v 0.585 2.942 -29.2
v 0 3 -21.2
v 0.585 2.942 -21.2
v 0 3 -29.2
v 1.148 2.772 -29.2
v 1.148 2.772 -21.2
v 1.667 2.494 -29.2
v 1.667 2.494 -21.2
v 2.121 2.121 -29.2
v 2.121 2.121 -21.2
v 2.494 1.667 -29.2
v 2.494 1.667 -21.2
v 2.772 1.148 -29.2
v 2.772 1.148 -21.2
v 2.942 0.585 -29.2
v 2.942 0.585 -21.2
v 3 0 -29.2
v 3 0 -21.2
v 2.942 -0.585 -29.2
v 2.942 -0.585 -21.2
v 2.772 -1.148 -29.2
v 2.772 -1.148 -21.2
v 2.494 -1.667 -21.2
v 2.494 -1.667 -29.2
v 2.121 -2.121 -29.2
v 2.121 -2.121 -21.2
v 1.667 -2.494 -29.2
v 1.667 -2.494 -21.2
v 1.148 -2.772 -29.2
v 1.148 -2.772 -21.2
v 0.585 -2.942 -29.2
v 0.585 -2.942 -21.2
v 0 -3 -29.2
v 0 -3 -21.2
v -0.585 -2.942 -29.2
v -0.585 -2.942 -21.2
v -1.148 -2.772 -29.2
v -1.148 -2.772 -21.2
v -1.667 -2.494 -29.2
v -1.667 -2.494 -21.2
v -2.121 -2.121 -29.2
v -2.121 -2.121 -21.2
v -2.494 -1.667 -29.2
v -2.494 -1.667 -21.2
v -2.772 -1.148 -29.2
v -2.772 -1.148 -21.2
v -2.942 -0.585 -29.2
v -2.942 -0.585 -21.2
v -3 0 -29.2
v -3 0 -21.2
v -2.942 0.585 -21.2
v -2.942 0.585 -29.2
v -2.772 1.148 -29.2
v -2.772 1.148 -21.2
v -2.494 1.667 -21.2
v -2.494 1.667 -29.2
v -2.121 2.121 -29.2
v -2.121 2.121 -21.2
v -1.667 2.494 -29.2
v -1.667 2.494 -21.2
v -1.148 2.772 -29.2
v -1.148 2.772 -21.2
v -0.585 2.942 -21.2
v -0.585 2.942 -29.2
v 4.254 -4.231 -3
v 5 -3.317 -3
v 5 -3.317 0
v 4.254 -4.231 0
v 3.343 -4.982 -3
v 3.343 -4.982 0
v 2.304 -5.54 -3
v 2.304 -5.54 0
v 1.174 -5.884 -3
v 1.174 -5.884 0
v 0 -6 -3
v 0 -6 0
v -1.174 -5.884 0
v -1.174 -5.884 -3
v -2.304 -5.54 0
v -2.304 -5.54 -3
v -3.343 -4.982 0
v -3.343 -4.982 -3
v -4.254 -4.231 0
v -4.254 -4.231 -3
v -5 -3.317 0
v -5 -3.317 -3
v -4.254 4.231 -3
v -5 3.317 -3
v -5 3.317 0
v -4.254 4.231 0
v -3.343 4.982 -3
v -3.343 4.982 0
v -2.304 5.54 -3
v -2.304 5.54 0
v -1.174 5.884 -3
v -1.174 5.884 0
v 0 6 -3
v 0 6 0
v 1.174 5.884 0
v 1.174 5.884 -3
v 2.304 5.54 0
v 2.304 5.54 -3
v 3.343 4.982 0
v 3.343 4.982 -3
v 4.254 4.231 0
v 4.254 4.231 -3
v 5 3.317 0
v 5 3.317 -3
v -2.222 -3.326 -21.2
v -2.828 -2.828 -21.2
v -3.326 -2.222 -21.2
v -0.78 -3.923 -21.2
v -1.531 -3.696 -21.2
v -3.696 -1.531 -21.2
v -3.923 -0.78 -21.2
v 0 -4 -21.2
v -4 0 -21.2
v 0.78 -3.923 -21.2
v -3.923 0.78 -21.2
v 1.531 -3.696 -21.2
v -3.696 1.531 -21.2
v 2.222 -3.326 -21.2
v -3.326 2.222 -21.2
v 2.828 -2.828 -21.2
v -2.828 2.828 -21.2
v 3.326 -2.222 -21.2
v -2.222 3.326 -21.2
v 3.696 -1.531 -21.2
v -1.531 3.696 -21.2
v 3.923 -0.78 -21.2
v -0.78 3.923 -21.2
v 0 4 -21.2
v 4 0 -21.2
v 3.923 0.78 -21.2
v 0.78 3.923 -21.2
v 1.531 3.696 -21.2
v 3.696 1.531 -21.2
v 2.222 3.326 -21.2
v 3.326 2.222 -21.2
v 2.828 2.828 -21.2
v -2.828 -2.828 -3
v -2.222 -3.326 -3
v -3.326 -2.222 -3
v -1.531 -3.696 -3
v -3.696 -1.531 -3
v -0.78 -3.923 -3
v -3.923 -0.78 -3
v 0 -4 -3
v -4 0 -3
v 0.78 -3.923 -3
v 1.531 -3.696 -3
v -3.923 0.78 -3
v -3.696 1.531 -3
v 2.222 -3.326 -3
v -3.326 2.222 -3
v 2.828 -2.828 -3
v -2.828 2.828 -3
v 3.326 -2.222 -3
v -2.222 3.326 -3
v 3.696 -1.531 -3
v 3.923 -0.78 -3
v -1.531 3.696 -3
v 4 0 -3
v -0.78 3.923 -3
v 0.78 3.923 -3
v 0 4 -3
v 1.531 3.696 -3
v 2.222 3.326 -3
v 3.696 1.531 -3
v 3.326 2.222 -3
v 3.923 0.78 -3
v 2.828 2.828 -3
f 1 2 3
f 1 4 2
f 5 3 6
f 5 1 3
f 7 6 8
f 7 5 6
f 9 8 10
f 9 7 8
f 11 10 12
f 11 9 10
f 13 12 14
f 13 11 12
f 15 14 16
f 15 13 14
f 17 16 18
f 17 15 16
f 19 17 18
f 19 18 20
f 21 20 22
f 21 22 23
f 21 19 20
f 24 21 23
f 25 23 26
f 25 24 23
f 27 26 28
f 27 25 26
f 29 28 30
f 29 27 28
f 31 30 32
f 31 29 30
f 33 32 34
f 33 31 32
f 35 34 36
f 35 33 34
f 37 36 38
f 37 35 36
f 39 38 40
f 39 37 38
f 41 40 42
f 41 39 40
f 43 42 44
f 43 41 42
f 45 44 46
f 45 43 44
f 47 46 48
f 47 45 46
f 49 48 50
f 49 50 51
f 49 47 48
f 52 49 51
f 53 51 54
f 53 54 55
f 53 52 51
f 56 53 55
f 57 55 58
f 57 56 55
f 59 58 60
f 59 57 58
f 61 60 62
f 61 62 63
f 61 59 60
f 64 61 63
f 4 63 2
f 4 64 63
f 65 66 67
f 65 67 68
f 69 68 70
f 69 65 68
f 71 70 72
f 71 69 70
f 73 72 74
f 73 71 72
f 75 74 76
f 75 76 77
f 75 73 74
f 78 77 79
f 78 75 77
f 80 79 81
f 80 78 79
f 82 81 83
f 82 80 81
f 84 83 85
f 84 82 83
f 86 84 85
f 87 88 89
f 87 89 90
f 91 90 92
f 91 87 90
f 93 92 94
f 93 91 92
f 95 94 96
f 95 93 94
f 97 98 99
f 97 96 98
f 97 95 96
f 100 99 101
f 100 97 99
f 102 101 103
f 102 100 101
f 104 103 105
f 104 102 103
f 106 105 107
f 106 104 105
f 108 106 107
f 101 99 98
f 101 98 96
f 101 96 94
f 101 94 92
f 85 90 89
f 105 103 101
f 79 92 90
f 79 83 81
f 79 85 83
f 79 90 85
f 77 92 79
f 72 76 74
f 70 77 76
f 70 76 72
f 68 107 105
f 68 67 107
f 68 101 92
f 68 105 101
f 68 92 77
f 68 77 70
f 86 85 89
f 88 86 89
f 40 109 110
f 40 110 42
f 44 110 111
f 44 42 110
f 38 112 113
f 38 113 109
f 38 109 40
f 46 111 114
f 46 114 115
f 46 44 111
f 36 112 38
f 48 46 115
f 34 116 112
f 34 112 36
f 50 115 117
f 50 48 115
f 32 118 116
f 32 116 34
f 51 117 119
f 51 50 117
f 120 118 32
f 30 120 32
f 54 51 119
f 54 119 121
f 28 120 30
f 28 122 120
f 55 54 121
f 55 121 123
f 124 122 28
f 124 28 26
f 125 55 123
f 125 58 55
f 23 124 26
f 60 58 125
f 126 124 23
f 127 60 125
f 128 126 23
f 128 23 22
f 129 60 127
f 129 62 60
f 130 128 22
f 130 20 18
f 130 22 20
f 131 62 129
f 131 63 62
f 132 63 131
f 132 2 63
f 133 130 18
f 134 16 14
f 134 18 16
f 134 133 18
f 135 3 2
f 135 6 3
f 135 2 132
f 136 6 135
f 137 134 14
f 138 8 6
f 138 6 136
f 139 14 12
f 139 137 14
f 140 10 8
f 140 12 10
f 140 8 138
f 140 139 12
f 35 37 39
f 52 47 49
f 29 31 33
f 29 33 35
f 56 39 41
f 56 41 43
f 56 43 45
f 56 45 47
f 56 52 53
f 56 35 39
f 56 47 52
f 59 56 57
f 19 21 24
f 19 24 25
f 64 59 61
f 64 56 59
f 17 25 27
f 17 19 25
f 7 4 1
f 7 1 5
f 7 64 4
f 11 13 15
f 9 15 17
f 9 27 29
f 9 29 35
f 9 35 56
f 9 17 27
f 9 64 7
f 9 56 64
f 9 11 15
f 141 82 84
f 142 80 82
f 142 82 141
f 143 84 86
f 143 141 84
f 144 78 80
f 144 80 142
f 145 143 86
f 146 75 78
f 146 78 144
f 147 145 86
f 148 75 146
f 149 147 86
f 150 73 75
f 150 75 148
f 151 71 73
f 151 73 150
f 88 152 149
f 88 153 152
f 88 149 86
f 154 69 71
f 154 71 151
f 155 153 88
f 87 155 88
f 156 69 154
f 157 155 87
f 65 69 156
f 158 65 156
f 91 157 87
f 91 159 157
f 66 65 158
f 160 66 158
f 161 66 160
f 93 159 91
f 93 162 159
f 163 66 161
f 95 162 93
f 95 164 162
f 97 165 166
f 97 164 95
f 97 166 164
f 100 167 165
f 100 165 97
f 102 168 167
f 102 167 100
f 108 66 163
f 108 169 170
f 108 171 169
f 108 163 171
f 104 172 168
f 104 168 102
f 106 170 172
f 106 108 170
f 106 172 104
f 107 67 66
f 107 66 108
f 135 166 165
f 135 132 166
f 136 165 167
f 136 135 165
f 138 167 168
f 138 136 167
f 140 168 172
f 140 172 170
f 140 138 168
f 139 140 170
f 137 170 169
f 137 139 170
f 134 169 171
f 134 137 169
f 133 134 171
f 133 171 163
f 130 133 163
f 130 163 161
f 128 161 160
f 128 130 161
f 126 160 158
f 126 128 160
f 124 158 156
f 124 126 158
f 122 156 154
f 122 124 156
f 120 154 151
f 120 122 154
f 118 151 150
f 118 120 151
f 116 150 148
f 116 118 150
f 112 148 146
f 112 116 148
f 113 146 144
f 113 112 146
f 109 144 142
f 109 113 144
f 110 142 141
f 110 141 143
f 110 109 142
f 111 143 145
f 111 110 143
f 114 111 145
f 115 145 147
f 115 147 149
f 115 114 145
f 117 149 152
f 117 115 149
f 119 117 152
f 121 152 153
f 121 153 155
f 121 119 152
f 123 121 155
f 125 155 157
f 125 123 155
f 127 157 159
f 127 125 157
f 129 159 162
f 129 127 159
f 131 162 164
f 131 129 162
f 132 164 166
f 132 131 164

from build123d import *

# Parameters (mm, degrees)
SKETCH_3_OUTSIDE_W   = 20.754
SKETCH_3_OUTSIDE_H   = 20.754
SKETCH_3_OUTSIDE_W_2 = 10
SKETCH_3_OUTSIDE_H_2 = 14.97891863
CUT_EXTRUDE_1_DEPTH  = 10


with BuildPart() as part:
    # 草图2 → 旋转1 (revolve)
    with BuildSketch(Plane(origin=(0, 0, 0), x_dir=(0, 0, -1), z_dir=(1, 0, 0))):
        Polygon((0, 0), (0, 6), (3, 6), (3, 4), (21.2, 4), (21.2, 3), (29.2, 3), (29.2, 0), align=None)
    revolve(axis=Axis((0, 0, 0), (0, 0, -1)))

    # 草图3 outside → 切除-拉伸1 (cut)
    with BuildSketch(Plane.XY):
        Rectangle(SKETCH_3_OUTSIDE_W, SKETCH_3_OUTSIDE_H)
        Rectangle(SKETCH_3_OUTSIDE_W_2, SKETCH_3_OUTSIDE_H_2, mode=Mode.SUBTRACT)
    extrude(amount=-CUT_EXTRUDE_1_DEPTH, mode=Mode.SUBTRACT)


solid = part.part
